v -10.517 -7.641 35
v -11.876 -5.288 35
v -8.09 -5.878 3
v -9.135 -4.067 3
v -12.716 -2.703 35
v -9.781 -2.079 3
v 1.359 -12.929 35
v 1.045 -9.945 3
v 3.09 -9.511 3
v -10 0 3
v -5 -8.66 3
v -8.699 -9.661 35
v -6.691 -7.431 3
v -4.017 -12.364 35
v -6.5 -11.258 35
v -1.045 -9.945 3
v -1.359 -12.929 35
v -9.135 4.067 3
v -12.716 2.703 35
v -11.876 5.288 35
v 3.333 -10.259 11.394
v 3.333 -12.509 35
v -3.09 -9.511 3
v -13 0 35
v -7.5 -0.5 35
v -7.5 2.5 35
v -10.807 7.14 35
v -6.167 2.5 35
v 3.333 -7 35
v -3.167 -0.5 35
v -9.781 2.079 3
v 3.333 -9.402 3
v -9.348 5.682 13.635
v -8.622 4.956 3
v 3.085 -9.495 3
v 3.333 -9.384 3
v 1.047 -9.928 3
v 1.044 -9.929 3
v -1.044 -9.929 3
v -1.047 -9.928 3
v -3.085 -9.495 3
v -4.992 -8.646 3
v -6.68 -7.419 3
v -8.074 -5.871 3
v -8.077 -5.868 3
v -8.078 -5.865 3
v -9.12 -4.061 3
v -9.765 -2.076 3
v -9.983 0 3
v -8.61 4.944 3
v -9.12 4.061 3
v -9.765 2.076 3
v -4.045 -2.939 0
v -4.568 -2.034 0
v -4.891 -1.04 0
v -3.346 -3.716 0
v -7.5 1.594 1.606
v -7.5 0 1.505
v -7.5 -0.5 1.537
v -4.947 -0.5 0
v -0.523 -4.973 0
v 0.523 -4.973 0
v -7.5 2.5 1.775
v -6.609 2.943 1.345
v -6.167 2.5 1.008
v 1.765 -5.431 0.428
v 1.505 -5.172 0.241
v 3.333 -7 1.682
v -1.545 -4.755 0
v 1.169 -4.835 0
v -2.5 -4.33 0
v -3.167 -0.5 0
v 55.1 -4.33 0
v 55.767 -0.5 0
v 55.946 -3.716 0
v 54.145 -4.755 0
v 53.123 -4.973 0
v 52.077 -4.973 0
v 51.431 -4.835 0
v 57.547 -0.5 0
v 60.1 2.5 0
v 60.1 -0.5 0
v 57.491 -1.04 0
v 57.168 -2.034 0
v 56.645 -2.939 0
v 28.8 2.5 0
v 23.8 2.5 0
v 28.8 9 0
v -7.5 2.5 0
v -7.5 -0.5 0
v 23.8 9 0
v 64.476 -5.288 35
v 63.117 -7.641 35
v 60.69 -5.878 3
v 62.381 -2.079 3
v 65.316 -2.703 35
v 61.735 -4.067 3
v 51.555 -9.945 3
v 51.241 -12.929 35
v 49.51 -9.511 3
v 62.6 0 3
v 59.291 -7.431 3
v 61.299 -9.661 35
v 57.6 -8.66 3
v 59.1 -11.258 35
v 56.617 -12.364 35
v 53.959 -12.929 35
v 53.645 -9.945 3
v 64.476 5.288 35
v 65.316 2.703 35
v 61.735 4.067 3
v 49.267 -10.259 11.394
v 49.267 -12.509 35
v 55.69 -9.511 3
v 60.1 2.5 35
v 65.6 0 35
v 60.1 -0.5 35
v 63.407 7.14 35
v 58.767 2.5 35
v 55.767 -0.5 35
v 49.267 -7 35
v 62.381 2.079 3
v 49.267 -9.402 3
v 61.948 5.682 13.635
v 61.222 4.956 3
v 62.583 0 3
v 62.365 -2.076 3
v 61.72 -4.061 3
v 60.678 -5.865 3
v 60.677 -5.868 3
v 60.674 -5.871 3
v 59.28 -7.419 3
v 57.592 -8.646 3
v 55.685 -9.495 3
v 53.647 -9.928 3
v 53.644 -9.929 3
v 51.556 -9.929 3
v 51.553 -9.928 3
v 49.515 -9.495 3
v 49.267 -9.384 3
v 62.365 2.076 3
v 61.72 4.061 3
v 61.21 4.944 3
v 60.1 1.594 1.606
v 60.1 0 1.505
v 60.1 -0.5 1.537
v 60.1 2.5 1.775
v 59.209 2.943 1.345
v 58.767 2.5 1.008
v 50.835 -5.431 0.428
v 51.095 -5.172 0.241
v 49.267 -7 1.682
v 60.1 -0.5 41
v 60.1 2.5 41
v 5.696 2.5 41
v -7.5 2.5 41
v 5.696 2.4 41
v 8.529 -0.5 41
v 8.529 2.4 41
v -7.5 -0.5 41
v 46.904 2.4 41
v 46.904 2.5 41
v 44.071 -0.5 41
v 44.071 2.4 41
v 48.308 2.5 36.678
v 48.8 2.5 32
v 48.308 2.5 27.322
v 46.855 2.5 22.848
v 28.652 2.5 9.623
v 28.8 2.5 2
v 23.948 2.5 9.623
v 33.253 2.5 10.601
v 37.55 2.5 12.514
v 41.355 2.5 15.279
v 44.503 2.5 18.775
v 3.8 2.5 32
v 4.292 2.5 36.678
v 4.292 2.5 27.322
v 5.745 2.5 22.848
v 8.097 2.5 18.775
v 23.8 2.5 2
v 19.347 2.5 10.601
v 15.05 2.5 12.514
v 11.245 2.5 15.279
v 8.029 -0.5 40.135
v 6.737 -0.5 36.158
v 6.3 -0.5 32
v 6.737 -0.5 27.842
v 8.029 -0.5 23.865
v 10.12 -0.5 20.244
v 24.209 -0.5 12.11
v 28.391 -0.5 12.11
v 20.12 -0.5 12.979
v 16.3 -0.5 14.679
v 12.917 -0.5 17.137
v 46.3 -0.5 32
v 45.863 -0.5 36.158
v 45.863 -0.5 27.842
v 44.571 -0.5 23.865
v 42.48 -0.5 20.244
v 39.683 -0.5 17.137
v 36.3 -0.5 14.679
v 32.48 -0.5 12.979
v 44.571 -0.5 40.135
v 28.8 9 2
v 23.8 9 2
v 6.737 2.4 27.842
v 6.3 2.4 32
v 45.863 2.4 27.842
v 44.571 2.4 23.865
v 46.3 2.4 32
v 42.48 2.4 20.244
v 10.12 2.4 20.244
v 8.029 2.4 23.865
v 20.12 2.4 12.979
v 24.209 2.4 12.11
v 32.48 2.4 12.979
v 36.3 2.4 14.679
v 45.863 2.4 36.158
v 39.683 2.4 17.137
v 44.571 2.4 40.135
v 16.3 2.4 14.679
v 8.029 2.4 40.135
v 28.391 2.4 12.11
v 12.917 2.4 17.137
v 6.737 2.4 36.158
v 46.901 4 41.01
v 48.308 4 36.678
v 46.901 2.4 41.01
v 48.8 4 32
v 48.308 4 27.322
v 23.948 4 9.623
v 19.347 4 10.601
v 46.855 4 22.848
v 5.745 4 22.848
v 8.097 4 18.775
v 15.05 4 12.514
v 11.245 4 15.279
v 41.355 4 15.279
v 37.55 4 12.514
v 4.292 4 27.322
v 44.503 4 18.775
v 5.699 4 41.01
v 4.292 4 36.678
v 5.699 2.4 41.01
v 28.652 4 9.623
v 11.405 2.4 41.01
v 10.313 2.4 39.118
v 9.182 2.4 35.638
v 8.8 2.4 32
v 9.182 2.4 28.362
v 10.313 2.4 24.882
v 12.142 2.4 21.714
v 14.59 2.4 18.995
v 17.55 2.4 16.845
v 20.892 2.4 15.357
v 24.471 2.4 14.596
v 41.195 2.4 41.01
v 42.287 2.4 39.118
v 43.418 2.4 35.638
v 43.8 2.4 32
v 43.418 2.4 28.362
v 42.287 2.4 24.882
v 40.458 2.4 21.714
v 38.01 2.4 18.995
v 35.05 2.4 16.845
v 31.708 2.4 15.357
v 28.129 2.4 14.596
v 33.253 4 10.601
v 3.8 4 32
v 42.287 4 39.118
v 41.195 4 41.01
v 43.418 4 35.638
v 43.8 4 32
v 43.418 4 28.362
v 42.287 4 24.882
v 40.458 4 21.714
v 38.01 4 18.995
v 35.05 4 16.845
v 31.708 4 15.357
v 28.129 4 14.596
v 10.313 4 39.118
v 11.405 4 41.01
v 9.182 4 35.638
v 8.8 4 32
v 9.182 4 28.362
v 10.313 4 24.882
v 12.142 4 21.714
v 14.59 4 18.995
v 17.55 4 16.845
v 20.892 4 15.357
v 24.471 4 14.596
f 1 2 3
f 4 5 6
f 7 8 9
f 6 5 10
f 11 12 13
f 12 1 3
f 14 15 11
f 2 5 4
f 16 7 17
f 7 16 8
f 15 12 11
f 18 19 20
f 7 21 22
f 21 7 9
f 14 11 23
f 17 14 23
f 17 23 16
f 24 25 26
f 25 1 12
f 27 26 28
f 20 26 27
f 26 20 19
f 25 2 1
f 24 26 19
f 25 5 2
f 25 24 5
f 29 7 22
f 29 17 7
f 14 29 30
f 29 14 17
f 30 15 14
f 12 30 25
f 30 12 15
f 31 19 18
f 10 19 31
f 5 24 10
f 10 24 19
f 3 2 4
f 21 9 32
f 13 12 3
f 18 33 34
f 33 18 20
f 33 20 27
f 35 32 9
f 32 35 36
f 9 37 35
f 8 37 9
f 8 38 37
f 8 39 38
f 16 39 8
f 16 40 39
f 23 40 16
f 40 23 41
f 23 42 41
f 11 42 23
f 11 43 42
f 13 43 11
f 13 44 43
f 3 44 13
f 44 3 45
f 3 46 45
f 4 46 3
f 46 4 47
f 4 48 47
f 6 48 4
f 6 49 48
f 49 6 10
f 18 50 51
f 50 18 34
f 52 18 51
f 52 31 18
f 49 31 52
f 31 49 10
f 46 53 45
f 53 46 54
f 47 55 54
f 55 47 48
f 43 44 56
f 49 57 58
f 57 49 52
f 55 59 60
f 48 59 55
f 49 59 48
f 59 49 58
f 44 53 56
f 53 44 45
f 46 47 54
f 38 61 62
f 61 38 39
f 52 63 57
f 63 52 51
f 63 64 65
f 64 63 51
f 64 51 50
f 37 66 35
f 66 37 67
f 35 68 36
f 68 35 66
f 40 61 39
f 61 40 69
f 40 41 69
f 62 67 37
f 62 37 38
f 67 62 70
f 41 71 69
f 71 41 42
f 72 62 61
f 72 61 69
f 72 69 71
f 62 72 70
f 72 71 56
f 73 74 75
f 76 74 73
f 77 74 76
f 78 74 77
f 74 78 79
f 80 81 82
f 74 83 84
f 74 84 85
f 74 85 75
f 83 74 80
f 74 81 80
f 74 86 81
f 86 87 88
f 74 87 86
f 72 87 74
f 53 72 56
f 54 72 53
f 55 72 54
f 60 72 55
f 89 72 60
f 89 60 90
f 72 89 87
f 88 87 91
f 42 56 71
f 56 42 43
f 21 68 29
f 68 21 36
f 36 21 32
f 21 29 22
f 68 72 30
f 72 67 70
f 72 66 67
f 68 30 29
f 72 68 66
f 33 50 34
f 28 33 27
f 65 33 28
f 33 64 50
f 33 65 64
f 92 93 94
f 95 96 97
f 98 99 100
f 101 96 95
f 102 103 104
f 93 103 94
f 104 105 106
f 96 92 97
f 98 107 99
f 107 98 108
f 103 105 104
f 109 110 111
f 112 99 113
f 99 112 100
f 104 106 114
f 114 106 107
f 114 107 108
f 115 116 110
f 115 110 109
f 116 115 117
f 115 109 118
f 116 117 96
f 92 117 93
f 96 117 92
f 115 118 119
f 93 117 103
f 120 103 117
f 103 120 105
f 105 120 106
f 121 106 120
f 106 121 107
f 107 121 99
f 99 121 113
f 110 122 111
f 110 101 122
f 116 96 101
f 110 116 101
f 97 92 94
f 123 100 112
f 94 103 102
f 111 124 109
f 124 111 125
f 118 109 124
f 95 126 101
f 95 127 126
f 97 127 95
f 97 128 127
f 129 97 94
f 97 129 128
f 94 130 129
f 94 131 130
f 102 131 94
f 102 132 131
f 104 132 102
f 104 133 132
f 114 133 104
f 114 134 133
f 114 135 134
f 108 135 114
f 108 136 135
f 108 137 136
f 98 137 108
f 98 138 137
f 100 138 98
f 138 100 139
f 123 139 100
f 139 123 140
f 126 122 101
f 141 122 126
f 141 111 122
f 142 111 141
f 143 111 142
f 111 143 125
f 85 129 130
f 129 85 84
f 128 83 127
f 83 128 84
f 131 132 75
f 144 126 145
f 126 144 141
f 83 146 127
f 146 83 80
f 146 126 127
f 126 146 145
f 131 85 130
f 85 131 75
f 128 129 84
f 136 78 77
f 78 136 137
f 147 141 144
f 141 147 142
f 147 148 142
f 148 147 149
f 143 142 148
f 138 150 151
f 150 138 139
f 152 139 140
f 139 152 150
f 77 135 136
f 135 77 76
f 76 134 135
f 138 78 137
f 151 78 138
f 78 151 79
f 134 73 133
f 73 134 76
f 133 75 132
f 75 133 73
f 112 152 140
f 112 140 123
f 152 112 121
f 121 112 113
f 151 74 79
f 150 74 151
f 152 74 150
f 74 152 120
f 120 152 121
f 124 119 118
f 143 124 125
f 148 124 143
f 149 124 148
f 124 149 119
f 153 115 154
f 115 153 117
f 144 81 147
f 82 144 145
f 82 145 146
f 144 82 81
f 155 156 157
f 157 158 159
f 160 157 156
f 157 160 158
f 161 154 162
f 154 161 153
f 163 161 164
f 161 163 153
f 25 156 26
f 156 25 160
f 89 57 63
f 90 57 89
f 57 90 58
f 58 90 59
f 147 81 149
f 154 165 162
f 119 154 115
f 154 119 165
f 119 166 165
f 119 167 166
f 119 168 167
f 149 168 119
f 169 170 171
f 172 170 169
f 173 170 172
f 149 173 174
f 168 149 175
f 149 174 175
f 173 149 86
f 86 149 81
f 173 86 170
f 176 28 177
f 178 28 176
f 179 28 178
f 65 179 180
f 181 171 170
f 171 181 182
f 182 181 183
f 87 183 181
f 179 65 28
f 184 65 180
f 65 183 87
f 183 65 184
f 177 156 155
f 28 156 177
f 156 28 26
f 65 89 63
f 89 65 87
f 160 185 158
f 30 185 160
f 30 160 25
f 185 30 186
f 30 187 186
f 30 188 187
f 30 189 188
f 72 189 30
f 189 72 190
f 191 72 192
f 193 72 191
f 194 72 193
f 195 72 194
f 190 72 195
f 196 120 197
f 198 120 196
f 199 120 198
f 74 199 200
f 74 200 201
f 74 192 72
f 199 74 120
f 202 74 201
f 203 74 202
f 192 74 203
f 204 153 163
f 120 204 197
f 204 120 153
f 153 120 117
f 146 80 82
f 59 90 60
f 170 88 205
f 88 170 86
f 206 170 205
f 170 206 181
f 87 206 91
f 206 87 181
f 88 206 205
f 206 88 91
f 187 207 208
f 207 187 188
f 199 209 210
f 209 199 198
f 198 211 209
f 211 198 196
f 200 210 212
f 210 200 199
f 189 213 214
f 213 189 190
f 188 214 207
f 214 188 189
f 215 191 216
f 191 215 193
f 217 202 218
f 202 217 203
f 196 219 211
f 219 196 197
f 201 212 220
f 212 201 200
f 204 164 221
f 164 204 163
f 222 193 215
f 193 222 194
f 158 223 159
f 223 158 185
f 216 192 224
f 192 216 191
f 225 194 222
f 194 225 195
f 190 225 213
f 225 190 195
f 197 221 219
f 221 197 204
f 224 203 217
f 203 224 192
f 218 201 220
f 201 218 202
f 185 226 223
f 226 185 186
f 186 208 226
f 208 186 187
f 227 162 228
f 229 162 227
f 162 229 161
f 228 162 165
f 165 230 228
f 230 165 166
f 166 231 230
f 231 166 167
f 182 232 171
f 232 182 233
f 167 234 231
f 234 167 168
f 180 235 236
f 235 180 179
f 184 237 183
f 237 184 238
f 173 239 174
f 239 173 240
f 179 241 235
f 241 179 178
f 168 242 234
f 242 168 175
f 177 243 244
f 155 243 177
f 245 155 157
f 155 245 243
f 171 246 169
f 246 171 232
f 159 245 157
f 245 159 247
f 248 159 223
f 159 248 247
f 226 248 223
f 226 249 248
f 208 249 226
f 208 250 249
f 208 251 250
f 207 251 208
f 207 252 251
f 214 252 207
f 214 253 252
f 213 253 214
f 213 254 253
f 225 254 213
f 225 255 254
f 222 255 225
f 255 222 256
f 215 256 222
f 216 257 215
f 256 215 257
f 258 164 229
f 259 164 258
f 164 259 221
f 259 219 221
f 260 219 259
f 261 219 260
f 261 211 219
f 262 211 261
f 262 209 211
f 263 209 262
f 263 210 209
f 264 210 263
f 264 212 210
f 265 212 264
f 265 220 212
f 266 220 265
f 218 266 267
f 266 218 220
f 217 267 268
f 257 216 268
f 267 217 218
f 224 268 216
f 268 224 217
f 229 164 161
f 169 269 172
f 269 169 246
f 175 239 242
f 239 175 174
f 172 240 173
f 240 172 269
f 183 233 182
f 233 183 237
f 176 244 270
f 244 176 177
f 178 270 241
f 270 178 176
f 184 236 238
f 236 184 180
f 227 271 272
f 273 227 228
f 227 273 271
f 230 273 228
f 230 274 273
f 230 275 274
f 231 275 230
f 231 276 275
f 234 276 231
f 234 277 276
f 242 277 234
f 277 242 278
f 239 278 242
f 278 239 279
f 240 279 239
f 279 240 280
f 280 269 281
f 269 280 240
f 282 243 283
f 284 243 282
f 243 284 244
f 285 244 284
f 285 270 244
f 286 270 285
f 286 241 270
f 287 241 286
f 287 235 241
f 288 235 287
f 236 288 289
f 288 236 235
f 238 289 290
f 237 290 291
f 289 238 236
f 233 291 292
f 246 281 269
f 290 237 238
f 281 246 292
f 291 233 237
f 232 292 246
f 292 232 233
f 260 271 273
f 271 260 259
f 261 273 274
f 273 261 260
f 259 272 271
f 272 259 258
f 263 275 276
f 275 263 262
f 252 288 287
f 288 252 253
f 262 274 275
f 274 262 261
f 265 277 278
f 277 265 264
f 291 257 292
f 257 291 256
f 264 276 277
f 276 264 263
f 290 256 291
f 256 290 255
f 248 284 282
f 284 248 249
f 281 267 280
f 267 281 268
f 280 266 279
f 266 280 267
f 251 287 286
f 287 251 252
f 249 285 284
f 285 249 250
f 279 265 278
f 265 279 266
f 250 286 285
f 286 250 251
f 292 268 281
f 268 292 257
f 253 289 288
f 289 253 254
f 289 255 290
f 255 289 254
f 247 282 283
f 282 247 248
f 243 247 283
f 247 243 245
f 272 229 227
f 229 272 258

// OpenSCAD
thermometerRadius = 40/2;
thermometerHeight = thermometerRadius+12;
thermometerMountThickness = 1.6;
thermometerMountRadius = 35/2;


cylinderTopRadius = 13; //11; //12
cylinderBottomRadius = 10; //10; //12
cylinderBottom = 3;
cylinderRadius = 6;
cylinderSpace = 52.6;
cylinderHeight = thermometerHeight;

baseThickness = 3;
baseHeight = thermometerHeight+9;
baseY = -cylinderBottomRadius+11;
baseLength = cylinderSpace+1.5*cylinderBottomRadius;

skirtThickness = 5;
skirtHeight = 2;
skirtLength = 5;

module Cylinder()
{
  difference()
  {
    union()
    {
      translate([0,0,cylinderBottom])
        cylinder(cylinderHeight,
                 cylinderBottomRadius,
                 cylinderTopRadius);
      translate([0,0,0])
        cylinder(cylinderBottom+0.01,
                 cylinderBottomRadius/2,
                 cylinderBottomRadius);
    };
    translate([cylinderBottomRadius/3,
               -cylinderTopRadius-1, //cylinderBottomRadius
               -1])
      cube([10,100,100]);
    translate([cylinderBottomRadius/3,
               -cylinderBottomRadius+baseThickness,
               -1])
      rotate([0,0,45])
        cube([200,220,200]);
  };
};

module Skirt()
{
  translate([(cylinderSpace-skirtThickness)/2,baseY,0])
    cube([skirtThickness, 
          skirtLength+baseThickness, 
          skirtHeight]);
};


module Base()
{
  Cylinder();
  
  translate([cylinderSpace,0,0])
    mirror([1,0,0])
      Cylinder();
  
  translate([cylinderSpace/2,
             baseY,
             baseHeight/2])
    cube([baseLength,
          baseThickness,
          baseHeight], center=true);
  Skirt();  // This stops my slicer from adding a skirt.
  
};

module Thermometer()
{
  translate([cylinderSpace/2,
             -cylinderRadius-baseThickness,
             thermometerHeight])
    rotate([-90,0,0])
      cylinder(100,thermometerRadius,thermometerRadius);
};

difference()
{
  Base();
  Thermometer();
};

difference()
{
  translate([cylinderSpace/2,
             baseY+baseThickness,
           thermometerHeight])
    rotate([90,0,0])
      difference()
      {
        cylinder(thermometerMountThickness,
                 thermometerMountRadius+5,
                 thermometerMountRadius+5);
        translate([0,0,-1])
          cylinder(thermometerMountThickness+2,
                   thermometerMountRadius,
                   thermometerMountRadius);
      };
  translate([0,0,baseHeight+0.01])
    cube([500,10,20]);
};
